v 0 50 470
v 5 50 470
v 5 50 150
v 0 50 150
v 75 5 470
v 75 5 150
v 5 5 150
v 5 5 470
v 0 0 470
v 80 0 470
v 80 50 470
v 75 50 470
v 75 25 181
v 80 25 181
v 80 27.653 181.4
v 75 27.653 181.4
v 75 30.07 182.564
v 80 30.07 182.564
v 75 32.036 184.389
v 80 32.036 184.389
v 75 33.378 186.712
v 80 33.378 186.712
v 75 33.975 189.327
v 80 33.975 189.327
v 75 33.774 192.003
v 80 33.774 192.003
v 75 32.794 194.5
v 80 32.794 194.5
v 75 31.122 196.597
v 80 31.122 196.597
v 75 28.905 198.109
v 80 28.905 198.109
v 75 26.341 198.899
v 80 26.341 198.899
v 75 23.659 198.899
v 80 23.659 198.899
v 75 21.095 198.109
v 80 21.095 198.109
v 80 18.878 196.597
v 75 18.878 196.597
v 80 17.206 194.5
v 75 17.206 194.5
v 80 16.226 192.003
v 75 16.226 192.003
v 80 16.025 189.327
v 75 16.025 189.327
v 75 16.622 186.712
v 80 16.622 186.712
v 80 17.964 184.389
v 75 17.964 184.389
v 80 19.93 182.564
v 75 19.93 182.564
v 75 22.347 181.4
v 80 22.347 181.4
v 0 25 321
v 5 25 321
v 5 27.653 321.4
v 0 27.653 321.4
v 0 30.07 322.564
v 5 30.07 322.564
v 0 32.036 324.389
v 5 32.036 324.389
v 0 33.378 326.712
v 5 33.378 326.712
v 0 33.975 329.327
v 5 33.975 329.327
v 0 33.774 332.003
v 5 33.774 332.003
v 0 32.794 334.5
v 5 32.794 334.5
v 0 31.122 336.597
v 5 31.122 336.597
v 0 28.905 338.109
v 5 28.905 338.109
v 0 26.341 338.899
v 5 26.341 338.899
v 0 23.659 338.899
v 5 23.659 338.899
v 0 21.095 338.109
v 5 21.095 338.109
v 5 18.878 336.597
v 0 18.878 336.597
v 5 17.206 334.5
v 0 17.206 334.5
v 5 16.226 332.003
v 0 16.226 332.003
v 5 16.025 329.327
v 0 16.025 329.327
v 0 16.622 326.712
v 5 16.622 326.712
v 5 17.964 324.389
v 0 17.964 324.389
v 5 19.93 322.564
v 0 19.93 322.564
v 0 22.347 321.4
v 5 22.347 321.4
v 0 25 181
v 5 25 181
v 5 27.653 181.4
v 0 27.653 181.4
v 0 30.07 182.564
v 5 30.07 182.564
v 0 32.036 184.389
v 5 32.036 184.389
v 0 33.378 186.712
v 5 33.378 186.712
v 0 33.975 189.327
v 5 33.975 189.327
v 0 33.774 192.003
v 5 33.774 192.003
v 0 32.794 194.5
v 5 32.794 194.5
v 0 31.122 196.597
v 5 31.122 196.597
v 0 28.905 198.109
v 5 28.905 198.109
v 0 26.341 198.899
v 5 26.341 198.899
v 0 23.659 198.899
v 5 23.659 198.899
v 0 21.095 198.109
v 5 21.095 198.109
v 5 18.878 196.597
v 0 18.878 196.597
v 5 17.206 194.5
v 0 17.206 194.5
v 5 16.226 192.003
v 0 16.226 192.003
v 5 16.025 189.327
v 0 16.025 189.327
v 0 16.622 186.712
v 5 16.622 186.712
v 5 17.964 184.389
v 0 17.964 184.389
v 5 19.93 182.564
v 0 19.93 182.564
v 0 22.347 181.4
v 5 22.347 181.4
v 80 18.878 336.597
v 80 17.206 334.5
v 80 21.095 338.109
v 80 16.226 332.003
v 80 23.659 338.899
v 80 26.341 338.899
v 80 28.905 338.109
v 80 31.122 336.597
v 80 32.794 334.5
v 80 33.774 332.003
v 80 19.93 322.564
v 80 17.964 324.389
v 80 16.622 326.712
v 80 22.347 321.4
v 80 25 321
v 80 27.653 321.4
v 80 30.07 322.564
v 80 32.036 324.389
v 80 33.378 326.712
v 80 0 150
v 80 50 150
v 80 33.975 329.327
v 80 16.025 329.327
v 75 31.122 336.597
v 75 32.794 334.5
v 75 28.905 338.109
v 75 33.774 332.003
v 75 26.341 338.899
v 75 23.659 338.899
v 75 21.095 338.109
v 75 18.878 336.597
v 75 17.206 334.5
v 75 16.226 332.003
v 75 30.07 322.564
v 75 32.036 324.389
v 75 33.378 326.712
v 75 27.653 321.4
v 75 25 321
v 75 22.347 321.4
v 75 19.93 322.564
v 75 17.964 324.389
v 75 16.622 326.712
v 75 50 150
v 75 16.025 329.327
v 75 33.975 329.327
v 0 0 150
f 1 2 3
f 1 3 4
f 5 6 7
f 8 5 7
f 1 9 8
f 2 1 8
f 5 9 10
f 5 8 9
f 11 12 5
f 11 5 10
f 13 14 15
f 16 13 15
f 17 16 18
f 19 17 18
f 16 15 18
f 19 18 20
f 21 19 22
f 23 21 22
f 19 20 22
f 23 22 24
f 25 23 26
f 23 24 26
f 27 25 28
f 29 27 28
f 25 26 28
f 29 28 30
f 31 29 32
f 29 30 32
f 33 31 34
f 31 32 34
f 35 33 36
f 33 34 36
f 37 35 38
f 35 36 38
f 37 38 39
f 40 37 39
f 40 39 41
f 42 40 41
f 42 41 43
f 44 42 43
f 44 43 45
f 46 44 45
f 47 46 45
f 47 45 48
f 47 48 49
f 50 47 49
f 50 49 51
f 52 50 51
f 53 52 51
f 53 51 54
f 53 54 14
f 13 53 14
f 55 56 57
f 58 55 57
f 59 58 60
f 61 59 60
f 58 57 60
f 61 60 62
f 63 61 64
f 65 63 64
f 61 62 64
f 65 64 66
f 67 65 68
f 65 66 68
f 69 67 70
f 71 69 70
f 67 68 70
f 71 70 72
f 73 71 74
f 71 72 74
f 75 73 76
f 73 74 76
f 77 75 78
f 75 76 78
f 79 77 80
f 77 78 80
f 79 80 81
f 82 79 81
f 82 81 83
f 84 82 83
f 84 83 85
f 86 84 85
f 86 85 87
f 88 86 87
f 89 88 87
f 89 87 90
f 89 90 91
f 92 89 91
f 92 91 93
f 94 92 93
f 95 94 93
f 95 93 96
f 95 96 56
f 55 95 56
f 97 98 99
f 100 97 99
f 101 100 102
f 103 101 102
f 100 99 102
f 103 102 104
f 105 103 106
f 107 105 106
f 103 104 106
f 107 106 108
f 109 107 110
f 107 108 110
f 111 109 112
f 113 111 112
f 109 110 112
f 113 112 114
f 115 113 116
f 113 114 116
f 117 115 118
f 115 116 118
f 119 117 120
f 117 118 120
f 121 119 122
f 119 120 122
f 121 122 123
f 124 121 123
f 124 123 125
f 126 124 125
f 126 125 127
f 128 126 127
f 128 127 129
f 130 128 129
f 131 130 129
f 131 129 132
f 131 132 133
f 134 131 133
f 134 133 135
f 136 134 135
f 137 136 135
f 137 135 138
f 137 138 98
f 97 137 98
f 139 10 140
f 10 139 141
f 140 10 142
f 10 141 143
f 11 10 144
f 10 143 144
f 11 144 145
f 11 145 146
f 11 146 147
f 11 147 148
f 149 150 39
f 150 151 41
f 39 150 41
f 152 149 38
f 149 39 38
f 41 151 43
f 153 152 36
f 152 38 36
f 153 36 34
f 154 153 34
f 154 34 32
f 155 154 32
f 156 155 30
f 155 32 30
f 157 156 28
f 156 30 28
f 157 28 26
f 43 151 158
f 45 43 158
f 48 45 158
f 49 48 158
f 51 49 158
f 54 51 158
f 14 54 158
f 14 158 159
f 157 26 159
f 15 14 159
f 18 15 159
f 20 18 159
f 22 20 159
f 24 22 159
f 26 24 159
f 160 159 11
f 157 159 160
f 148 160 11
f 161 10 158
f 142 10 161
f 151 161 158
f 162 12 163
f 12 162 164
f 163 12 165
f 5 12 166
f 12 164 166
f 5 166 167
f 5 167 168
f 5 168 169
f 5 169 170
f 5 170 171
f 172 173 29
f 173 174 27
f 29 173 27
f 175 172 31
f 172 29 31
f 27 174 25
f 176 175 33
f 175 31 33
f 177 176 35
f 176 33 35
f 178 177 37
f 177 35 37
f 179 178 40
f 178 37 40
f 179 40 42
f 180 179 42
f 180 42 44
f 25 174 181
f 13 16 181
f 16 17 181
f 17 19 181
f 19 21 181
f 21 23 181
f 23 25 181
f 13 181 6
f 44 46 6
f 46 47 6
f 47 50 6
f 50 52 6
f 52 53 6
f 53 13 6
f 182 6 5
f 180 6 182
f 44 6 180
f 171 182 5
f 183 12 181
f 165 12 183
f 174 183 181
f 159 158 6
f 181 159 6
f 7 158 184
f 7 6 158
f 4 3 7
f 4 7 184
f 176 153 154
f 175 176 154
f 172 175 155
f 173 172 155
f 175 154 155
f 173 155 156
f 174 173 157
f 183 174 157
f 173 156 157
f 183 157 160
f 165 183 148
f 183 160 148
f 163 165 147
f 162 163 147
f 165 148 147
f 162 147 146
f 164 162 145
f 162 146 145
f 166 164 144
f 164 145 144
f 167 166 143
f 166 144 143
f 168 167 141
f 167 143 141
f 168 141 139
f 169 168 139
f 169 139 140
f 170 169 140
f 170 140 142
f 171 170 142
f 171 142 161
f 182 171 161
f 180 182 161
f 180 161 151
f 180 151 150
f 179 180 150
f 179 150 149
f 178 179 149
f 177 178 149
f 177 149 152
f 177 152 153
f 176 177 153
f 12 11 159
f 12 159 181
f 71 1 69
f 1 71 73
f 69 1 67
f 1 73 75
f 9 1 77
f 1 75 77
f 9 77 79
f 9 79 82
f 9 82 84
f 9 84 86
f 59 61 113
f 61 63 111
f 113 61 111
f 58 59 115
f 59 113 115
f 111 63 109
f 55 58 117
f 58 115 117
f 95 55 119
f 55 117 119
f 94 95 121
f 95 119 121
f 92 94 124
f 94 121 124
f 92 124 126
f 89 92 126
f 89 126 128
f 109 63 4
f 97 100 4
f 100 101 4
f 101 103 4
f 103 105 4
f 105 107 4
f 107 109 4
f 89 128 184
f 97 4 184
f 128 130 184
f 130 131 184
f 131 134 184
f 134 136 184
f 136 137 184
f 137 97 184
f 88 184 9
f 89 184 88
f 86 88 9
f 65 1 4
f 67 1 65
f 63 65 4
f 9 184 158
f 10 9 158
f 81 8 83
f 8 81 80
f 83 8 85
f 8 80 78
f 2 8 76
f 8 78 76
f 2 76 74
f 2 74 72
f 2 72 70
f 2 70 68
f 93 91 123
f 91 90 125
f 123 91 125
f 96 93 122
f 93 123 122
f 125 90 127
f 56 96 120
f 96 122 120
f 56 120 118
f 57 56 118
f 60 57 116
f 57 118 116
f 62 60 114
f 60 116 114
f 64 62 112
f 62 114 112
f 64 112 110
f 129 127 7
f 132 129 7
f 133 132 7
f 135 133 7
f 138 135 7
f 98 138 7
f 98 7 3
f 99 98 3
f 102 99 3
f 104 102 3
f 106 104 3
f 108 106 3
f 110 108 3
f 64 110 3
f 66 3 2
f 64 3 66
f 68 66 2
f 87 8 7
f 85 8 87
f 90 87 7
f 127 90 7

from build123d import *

# Parameters (mm, degrees)
Y_KSEKLIK_EKSTR_ZYON1_DEPTH = 500
IZIM2_R                     = 9
KES_EKSTR_ZYON1_DEPTH       = 100
KES_EKSTR_ZYON3_DEPTH       = 150
KES_EKSTR_ZYON4_DEPTH       = 30


with BuildPart() as part:
    # Çizim1 → Yükseklik-Ekstrüzyon1 (new body)
    with BuildSketch(Plane.XY):
        Polygon((0, 0), (80, 0), (80, 50), (75, 50), (75, 5), (5, 5), (5, 50), (0, 50), align=None)
    extrude(amount=Y_KSEKLIK_EKSTR_ZYON1_DEPTH)

    # Çizim2 → Kes-Ekstrüzyon1 (cut)
    with BuildSketch(Plane(origin=(80, 0, 0), x_dir=(0, 0, -1), z_dir=(1, 0, 0))):
        with Locations((-330, 25)):
            Circle(IZIM2_R)
        with Locations((-190, 25)):
            Circle(IZIM2_R)
    extrude(amount=-KES_EKSTR_ZYON1_DEPTH, mode=Mode.SUBTRACT)

    # Çizim4 → Kes-Ekstrüzyon3 (cut)
    with BuildSketch(Plane(origin=(0, 0, 0), x_dir=(-1, 0, 0), z_dir=(0, 0, -1))):
        Polygon((0, 0), (0, 50), (-5, 50), (-5, 5), (-75, 5), (-75, 50), (-80, 50), (-80, 0), align=None)
    extrude(amount=-KES_EKSTR_ZYON3_DEPTH, mode=Mode.SUBTRACT)

    # Çizim5 → Kes-Ekstrüzyon4 (cut)
    with BuildSketch(Plane.XY.offset(500)):
        Polygon((0, 50), (0, 0), (80, 0), (80, 50), (75, 50), (75, 5), (5, 5), (5, 50), align=None)
    extrude(amount=-KES_EKSTR_ZYON4_DEPTH, mode=Mode.SUBTRACT)


solid = part.part
